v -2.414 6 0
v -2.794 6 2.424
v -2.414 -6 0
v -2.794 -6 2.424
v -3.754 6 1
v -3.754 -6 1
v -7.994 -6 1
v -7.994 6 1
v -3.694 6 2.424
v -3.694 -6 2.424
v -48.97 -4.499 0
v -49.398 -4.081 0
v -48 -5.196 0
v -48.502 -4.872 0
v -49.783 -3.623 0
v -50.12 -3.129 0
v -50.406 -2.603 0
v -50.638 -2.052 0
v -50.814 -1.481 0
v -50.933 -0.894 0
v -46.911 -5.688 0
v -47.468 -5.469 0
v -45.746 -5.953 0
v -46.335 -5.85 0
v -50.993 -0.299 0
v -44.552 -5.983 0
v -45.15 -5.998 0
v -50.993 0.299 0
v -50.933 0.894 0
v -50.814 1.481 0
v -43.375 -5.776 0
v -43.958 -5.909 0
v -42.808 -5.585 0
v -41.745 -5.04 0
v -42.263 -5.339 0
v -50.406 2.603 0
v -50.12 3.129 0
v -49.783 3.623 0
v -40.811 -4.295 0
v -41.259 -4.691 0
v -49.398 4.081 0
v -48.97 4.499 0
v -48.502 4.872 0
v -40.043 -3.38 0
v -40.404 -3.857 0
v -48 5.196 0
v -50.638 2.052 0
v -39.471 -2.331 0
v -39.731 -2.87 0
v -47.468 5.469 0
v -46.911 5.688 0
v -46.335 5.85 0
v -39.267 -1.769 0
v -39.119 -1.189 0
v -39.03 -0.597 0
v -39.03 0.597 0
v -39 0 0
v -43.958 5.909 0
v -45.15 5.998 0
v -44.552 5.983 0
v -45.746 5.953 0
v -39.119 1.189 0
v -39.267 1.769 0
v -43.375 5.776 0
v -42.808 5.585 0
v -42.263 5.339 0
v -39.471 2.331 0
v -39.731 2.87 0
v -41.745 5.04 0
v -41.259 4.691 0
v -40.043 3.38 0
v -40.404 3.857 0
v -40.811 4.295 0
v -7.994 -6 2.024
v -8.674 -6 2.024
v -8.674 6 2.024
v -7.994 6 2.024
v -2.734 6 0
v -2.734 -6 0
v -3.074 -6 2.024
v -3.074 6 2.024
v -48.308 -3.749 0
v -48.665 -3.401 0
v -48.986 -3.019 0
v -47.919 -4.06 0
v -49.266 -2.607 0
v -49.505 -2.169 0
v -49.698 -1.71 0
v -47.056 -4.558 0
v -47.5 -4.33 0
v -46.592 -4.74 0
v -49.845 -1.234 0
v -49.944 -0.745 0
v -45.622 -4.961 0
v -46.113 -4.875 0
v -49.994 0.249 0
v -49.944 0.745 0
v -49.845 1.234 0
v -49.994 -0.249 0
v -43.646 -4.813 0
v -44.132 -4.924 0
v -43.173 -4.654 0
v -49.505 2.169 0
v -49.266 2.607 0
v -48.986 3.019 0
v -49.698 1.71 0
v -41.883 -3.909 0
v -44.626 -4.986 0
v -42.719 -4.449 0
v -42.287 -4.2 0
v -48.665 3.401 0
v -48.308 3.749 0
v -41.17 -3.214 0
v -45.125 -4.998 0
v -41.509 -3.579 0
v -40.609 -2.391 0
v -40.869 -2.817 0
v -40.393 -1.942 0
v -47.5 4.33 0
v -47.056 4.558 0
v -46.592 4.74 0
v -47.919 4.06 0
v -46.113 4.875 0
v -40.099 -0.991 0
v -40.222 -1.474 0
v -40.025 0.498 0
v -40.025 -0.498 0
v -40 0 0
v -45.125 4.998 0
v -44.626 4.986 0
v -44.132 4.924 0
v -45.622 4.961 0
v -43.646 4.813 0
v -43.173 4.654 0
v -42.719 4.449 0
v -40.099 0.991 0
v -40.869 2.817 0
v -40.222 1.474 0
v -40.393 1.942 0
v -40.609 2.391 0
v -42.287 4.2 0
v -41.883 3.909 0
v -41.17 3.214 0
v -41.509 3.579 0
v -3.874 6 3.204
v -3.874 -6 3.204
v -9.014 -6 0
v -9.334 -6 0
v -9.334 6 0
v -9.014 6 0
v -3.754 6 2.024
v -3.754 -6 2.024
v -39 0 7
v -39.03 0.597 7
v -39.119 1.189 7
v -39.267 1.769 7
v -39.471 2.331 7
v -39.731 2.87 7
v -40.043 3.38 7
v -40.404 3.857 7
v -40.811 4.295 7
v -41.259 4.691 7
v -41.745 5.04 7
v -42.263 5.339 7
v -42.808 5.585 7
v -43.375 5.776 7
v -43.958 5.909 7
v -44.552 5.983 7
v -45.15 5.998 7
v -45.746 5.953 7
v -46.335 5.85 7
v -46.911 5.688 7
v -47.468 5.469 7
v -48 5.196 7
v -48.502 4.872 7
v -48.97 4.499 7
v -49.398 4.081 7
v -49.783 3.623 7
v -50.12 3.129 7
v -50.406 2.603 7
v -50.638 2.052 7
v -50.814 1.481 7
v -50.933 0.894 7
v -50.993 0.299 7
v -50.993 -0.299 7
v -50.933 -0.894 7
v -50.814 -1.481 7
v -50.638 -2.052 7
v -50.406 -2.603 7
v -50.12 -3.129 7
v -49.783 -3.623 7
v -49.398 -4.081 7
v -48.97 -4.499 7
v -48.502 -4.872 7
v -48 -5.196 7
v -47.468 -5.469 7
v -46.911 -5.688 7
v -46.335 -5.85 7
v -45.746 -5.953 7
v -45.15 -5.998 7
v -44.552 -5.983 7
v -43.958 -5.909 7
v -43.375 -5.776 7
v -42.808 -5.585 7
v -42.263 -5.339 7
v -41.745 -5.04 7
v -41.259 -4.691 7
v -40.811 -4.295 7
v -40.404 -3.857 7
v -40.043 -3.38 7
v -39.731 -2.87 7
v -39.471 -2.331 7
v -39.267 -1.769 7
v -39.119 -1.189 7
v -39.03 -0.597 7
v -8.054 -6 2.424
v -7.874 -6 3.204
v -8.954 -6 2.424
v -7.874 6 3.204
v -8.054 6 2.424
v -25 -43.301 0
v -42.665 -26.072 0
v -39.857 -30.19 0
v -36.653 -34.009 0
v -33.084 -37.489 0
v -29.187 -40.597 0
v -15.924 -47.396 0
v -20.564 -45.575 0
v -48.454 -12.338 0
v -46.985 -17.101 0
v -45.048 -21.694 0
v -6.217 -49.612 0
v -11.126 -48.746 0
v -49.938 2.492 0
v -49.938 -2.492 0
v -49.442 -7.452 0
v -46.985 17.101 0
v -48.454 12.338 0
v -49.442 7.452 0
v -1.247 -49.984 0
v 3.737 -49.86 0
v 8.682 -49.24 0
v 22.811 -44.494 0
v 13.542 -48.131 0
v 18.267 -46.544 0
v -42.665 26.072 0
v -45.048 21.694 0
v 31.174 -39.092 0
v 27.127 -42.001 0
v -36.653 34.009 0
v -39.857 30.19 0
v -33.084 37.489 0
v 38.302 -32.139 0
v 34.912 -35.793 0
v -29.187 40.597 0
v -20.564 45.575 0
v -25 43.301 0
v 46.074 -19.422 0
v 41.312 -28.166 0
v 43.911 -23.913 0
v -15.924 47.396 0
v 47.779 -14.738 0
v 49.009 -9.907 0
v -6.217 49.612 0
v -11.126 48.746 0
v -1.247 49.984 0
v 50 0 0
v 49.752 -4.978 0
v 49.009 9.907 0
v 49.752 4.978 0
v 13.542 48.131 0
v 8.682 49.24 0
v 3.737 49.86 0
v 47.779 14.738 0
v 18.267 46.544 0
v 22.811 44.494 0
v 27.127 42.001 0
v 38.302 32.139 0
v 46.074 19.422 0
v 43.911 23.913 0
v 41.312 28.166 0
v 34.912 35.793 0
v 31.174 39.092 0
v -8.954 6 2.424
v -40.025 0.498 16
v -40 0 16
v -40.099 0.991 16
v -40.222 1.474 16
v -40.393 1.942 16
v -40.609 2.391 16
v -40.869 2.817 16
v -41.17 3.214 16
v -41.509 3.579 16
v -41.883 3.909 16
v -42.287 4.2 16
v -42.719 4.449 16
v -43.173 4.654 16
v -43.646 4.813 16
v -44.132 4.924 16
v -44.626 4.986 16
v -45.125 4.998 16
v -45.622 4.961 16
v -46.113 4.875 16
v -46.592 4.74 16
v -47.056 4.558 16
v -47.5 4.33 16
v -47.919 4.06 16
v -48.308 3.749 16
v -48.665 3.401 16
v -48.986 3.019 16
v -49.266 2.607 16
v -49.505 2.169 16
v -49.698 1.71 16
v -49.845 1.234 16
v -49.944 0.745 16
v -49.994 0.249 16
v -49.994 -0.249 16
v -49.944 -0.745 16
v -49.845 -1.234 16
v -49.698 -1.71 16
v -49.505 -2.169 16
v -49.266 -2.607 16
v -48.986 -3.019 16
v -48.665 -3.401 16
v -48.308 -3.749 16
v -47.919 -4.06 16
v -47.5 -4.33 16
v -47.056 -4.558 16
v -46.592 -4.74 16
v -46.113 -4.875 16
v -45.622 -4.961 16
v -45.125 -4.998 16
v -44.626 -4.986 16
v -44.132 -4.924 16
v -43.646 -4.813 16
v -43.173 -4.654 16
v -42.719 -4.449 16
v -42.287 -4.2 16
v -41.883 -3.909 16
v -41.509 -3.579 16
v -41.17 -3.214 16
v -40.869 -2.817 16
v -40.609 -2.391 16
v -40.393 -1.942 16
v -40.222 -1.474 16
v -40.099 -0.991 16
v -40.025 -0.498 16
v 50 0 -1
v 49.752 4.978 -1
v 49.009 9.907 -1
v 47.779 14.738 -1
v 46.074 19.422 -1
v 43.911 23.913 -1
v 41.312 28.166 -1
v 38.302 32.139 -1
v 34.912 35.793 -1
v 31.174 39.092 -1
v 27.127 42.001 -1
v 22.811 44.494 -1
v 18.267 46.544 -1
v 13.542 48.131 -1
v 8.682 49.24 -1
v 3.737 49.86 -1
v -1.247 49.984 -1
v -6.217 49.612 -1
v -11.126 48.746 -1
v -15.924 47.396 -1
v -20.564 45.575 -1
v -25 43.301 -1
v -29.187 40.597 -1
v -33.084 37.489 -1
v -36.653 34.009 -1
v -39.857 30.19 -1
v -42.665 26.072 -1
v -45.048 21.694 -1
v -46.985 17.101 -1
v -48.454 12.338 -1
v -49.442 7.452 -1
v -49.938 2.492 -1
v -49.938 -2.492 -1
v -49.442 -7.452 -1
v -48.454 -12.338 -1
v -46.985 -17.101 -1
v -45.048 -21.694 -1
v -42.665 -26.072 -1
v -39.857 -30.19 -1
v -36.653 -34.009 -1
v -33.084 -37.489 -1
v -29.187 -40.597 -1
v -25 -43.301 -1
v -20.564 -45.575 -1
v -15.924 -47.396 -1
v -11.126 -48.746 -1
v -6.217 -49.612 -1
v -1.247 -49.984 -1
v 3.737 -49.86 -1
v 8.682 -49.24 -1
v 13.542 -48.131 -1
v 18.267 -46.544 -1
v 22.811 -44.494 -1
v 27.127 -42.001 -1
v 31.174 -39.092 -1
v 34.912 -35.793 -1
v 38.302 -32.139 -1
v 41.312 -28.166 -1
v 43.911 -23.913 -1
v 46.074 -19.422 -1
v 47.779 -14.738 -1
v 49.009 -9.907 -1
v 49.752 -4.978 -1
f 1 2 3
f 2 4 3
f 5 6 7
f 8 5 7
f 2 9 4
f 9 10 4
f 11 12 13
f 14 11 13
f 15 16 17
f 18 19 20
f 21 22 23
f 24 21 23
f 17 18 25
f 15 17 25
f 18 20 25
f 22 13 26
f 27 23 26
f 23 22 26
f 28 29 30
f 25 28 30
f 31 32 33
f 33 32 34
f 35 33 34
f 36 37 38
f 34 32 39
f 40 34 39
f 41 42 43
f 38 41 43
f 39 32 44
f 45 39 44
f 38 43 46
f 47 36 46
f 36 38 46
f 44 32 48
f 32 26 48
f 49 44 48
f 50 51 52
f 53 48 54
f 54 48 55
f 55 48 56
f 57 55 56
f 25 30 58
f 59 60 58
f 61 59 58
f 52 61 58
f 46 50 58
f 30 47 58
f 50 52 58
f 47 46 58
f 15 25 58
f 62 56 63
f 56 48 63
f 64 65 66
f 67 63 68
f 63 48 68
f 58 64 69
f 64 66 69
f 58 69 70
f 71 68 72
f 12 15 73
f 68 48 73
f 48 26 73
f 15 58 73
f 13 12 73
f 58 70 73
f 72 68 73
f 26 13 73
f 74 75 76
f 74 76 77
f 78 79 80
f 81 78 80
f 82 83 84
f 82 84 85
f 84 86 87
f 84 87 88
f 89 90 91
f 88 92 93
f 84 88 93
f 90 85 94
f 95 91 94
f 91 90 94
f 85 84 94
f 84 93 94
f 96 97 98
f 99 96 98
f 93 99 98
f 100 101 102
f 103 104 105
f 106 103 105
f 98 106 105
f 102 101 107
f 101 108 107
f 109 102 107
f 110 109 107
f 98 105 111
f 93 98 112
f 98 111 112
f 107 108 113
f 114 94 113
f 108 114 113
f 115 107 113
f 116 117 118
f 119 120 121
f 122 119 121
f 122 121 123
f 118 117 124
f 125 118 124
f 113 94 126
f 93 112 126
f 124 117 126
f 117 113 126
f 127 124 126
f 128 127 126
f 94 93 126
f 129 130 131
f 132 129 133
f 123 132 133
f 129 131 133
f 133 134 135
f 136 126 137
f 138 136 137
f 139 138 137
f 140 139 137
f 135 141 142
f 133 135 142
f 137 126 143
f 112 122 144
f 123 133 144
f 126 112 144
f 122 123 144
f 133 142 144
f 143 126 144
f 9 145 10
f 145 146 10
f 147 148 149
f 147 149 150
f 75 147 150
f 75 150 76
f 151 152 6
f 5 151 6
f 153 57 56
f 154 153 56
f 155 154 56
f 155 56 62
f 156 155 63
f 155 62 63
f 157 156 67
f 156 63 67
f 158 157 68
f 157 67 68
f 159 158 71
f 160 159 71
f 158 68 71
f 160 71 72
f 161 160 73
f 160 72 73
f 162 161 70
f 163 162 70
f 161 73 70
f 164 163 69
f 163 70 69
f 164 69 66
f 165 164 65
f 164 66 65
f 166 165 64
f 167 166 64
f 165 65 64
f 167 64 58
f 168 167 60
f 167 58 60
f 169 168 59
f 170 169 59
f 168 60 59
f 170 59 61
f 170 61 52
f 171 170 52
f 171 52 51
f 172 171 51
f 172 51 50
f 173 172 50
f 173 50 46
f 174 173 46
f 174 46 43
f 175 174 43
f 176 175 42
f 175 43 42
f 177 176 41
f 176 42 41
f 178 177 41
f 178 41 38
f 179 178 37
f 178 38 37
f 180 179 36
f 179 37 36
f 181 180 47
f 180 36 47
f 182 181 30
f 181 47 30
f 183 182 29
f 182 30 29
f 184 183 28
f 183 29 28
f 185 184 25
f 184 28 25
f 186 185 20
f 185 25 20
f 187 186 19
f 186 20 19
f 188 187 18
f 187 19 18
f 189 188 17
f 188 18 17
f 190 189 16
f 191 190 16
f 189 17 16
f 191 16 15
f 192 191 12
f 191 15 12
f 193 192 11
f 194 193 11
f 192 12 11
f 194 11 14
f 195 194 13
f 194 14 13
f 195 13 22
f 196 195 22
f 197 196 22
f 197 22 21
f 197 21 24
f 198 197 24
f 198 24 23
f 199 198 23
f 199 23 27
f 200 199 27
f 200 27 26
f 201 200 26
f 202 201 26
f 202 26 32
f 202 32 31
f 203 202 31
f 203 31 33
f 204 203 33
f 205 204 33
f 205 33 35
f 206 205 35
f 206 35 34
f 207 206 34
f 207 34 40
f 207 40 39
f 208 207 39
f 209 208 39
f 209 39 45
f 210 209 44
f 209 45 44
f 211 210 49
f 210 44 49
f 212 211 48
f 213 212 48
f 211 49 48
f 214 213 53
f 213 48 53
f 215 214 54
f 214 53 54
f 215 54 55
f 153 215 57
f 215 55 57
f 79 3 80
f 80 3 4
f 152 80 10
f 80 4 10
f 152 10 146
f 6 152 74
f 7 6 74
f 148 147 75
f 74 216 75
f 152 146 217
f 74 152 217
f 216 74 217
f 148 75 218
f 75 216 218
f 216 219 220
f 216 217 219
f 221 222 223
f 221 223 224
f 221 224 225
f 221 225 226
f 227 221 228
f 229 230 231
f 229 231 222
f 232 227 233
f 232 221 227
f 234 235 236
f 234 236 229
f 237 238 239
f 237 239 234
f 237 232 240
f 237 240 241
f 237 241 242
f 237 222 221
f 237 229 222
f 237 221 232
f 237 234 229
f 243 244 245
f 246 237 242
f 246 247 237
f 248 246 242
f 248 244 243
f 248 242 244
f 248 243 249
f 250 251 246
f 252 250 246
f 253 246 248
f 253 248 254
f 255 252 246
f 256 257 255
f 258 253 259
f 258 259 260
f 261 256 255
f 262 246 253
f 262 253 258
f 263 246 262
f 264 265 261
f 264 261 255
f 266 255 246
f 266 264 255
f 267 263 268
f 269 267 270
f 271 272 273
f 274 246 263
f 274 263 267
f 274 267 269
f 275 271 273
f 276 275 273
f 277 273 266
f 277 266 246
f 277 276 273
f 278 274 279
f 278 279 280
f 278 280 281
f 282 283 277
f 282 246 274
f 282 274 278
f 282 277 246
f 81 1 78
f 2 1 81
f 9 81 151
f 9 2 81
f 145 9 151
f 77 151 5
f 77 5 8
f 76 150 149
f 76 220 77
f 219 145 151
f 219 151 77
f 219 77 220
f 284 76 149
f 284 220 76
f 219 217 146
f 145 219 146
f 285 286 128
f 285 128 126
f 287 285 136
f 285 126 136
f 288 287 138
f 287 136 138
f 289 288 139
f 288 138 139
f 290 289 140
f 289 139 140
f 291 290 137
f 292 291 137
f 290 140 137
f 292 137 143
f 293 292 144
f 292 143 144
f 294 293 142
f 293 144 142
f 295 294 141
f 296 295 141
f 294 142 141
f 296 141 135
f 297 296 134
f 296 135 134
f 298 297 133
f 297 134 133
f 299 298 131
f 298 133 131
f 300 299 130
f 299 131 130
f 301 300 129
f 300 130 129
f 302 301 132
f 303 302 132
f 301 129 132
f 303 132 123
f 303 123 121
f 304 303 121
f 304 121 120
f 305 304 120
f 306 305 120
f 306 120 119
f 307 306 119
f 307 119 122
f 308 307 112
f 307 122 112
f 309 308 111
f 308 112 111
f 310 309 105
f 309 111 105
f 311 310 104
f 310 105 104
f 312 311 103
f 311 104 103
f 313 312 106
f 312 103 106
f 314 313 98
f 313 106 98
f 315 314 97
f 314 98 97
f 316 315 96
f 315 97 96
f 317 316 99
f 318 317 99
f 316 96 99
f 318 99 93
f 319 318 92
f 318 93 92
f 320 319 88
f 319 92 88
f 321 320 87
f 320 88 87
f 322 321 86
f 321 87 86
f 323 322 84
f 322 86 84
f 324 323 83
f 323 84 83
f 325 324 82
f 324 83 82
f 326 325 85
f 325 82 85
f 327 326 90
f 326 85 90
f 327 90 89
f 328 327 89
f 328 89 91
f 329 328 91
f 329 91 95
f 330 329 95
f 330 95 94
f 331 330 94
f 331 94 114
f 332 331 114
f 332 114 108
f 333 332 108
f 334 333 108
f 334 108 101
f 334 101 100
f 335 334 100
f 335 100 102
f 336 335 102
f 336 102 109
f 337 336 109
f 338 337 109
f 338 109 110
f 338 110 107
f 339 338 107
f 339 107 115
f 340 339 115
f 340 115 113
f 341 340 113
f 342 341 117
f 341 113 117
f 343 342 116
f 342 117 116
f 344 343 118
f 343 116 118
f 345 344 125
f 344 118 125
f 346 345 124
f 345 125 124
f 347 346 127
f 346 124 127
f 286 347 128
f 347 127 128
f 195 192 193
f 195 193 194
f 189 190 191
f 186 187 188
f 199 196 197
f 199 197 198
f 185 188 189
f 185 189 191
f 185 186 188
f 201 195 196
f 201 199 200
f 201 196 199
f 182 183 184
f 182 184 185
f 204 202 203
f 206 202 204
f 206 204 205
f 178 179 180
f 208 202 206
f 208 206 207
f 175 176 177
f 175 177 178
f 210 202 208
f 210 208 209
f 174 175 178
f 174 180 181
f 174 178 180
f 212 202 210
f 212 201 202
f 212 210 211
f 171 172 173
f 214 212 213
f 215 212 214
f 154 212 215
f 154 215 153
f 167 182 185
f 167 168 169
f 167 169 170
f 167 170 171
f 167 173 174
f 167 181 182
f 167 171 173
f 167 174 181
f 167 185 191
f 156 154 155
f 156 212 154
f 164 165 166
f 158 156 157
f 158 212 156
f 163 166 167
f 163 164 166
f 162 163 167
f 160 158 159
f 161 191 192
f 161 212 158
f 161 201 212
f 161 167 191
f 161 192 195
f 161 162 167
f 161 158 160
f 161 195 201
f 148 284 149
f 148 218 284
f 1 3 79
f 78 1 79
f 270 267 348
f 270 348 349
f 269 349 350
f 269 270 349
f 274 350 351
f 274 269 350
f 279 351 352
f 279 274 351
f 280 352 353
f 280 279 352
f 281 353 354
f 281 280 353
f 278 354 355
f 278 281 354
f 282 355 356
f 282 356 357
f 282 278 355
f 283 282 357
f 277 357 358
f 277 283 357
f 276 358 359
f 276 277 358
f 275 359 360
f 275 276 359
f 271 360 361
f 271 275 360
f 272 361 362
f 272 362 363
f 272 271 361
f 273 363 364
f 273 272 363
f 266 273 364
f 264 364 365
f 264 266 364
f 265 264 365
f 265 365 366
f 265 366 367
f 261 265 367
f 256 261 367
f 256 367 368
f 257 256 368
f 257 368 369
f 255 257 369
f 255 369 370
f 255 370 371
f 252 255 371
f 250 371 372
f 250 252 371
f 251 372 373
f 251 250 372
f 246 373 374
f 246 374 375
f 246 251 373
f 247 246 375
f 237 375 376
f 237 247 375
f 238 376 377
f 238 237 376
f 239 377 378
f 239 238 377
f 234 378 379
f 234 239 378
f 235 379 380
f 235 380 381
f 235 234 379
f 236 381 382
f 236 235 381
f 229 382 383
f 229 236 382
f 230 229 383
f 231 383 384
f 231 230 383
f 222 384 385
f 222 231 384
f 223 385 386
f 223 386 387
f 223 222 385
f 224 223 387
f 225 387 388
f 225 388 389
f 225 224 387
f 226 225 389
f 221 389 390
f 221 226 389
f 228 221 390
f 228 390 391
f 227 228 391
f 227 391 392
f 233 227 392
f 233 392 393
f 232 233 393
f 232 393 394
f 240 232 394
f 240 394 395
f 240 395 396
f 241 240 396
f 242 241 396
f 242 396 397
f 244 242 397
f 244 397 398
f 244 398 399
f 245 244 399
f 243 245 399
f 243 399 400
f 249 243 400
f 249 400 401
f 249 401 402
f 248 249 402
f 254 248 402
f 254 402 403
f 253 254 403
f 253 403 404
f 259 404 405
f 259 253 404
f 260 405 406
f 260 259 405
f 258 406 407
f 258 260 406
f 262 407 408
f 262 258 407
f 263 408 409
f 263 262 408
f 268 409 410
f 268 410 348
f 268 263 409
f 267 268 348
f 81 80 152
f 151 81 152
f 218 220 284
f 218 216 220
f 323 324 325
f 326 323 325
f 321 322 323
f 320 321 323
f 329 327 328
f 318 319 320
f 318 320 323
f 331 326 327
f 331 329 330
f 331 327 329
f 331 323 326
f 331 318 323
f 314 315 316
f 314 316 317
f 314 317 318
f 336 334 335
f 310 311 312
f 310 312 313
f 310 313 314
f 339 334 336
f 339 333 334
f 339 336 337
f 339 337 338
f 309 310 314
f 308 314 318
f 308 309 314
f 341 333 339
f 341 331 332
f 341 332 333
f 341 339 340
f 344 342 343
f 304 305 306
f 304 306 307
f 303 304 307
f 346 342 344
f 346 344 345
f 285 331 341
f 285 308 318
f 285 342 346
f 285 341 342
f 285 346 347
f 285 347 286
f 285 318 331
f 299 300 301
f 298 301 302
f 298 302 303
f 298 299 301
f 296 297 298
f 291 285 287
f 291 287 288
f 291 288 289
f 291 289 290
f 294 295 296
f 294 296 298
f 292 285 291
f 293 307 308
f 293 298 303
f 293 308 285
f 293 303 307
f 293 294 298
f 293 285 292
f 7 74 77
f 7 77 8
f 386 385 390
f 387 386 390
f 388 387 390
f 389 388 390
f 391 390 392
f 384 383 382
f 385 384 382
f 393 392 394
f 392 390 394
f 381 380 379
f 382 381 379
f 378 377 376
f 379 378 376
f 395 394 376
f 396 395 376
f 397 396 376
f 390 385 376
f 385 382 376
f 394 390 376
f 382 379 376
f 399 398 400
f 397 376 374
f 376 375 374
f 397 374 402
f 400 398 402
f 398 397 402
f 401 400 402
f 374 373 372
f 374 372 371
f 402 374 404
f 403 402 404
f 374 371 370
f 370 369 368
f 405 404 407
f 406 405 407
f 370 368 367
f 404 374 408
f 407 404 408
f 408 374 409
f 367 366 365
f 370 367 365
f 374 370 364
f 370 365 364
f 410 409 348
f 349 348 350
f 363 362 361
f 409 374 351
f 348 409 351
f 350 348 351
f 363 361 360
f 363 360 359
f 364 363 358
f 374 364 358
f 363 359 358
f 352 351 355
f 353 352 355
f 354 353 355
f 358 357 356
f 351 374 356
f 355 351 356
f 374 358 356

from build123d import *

# Parameters (mm, degrees)
F0_R     = 50
F1_DEPTH = 1
F2_R     = 5
F3_DEPTH = 16
F5_DEPTH = 6
F8_R     = 6
F9_DEPTH = 7


with BuildPart() as f1:
    # F0 (on Top) → F1 (new body)
    with BuildSketch(Plane.XY):
        Circle(F0_R)
    extrude(amount=-F1_DEPTH)


with BuildPart() as f3:
    # F2 (on Top) → F3 (new body)
    with BuildSketch(Plane.XY):
        with Locations((-45, 0)):
            Circle(F2_R)
    extrude(amount=F3_DEPTH)


with BuildPart() as f5:
    # F4 (on Front) → F5 (new body, symmetric)
    with BuildSketch(Plane.XZ):
        Polygon((-8.9535827212, 2.4236521956), (-9.3335827271, 0), (-9.0135823465, 0), (-8.6735826855, 2.0236521658), (-7.9935827688, 2.0236521658), (-7.9935827688, 1), (-5.8735829234, 1), (-5.8735829234, 3.2036522313), (-7.8735829234, 3.2036522313), (-8.0535829888, 2.4236521956), align=None)
    extrude(amount=F5_DEPTH, both=True)

    # F6: F5 across face


with BuildPart() as f5_1:
    add(f5.part)
    add(f5.part.mirror(Plane(origin=(-5.8735829234, 0, 2.1018261156), x_dir=(0, 1, 0), z_dir=(1, 0, 0))))


with BuildPart() as f9:
    # F8 (on Top) → F9 (new body)
    with BuildSketch(Plane.XY):
        with Locations((-45, 0)):
            Circle(F8_R)
    extrude(amount=F9_DEPTH)


solid = Compound([f1.part, f3.part, f5_1.part, f9.part])
